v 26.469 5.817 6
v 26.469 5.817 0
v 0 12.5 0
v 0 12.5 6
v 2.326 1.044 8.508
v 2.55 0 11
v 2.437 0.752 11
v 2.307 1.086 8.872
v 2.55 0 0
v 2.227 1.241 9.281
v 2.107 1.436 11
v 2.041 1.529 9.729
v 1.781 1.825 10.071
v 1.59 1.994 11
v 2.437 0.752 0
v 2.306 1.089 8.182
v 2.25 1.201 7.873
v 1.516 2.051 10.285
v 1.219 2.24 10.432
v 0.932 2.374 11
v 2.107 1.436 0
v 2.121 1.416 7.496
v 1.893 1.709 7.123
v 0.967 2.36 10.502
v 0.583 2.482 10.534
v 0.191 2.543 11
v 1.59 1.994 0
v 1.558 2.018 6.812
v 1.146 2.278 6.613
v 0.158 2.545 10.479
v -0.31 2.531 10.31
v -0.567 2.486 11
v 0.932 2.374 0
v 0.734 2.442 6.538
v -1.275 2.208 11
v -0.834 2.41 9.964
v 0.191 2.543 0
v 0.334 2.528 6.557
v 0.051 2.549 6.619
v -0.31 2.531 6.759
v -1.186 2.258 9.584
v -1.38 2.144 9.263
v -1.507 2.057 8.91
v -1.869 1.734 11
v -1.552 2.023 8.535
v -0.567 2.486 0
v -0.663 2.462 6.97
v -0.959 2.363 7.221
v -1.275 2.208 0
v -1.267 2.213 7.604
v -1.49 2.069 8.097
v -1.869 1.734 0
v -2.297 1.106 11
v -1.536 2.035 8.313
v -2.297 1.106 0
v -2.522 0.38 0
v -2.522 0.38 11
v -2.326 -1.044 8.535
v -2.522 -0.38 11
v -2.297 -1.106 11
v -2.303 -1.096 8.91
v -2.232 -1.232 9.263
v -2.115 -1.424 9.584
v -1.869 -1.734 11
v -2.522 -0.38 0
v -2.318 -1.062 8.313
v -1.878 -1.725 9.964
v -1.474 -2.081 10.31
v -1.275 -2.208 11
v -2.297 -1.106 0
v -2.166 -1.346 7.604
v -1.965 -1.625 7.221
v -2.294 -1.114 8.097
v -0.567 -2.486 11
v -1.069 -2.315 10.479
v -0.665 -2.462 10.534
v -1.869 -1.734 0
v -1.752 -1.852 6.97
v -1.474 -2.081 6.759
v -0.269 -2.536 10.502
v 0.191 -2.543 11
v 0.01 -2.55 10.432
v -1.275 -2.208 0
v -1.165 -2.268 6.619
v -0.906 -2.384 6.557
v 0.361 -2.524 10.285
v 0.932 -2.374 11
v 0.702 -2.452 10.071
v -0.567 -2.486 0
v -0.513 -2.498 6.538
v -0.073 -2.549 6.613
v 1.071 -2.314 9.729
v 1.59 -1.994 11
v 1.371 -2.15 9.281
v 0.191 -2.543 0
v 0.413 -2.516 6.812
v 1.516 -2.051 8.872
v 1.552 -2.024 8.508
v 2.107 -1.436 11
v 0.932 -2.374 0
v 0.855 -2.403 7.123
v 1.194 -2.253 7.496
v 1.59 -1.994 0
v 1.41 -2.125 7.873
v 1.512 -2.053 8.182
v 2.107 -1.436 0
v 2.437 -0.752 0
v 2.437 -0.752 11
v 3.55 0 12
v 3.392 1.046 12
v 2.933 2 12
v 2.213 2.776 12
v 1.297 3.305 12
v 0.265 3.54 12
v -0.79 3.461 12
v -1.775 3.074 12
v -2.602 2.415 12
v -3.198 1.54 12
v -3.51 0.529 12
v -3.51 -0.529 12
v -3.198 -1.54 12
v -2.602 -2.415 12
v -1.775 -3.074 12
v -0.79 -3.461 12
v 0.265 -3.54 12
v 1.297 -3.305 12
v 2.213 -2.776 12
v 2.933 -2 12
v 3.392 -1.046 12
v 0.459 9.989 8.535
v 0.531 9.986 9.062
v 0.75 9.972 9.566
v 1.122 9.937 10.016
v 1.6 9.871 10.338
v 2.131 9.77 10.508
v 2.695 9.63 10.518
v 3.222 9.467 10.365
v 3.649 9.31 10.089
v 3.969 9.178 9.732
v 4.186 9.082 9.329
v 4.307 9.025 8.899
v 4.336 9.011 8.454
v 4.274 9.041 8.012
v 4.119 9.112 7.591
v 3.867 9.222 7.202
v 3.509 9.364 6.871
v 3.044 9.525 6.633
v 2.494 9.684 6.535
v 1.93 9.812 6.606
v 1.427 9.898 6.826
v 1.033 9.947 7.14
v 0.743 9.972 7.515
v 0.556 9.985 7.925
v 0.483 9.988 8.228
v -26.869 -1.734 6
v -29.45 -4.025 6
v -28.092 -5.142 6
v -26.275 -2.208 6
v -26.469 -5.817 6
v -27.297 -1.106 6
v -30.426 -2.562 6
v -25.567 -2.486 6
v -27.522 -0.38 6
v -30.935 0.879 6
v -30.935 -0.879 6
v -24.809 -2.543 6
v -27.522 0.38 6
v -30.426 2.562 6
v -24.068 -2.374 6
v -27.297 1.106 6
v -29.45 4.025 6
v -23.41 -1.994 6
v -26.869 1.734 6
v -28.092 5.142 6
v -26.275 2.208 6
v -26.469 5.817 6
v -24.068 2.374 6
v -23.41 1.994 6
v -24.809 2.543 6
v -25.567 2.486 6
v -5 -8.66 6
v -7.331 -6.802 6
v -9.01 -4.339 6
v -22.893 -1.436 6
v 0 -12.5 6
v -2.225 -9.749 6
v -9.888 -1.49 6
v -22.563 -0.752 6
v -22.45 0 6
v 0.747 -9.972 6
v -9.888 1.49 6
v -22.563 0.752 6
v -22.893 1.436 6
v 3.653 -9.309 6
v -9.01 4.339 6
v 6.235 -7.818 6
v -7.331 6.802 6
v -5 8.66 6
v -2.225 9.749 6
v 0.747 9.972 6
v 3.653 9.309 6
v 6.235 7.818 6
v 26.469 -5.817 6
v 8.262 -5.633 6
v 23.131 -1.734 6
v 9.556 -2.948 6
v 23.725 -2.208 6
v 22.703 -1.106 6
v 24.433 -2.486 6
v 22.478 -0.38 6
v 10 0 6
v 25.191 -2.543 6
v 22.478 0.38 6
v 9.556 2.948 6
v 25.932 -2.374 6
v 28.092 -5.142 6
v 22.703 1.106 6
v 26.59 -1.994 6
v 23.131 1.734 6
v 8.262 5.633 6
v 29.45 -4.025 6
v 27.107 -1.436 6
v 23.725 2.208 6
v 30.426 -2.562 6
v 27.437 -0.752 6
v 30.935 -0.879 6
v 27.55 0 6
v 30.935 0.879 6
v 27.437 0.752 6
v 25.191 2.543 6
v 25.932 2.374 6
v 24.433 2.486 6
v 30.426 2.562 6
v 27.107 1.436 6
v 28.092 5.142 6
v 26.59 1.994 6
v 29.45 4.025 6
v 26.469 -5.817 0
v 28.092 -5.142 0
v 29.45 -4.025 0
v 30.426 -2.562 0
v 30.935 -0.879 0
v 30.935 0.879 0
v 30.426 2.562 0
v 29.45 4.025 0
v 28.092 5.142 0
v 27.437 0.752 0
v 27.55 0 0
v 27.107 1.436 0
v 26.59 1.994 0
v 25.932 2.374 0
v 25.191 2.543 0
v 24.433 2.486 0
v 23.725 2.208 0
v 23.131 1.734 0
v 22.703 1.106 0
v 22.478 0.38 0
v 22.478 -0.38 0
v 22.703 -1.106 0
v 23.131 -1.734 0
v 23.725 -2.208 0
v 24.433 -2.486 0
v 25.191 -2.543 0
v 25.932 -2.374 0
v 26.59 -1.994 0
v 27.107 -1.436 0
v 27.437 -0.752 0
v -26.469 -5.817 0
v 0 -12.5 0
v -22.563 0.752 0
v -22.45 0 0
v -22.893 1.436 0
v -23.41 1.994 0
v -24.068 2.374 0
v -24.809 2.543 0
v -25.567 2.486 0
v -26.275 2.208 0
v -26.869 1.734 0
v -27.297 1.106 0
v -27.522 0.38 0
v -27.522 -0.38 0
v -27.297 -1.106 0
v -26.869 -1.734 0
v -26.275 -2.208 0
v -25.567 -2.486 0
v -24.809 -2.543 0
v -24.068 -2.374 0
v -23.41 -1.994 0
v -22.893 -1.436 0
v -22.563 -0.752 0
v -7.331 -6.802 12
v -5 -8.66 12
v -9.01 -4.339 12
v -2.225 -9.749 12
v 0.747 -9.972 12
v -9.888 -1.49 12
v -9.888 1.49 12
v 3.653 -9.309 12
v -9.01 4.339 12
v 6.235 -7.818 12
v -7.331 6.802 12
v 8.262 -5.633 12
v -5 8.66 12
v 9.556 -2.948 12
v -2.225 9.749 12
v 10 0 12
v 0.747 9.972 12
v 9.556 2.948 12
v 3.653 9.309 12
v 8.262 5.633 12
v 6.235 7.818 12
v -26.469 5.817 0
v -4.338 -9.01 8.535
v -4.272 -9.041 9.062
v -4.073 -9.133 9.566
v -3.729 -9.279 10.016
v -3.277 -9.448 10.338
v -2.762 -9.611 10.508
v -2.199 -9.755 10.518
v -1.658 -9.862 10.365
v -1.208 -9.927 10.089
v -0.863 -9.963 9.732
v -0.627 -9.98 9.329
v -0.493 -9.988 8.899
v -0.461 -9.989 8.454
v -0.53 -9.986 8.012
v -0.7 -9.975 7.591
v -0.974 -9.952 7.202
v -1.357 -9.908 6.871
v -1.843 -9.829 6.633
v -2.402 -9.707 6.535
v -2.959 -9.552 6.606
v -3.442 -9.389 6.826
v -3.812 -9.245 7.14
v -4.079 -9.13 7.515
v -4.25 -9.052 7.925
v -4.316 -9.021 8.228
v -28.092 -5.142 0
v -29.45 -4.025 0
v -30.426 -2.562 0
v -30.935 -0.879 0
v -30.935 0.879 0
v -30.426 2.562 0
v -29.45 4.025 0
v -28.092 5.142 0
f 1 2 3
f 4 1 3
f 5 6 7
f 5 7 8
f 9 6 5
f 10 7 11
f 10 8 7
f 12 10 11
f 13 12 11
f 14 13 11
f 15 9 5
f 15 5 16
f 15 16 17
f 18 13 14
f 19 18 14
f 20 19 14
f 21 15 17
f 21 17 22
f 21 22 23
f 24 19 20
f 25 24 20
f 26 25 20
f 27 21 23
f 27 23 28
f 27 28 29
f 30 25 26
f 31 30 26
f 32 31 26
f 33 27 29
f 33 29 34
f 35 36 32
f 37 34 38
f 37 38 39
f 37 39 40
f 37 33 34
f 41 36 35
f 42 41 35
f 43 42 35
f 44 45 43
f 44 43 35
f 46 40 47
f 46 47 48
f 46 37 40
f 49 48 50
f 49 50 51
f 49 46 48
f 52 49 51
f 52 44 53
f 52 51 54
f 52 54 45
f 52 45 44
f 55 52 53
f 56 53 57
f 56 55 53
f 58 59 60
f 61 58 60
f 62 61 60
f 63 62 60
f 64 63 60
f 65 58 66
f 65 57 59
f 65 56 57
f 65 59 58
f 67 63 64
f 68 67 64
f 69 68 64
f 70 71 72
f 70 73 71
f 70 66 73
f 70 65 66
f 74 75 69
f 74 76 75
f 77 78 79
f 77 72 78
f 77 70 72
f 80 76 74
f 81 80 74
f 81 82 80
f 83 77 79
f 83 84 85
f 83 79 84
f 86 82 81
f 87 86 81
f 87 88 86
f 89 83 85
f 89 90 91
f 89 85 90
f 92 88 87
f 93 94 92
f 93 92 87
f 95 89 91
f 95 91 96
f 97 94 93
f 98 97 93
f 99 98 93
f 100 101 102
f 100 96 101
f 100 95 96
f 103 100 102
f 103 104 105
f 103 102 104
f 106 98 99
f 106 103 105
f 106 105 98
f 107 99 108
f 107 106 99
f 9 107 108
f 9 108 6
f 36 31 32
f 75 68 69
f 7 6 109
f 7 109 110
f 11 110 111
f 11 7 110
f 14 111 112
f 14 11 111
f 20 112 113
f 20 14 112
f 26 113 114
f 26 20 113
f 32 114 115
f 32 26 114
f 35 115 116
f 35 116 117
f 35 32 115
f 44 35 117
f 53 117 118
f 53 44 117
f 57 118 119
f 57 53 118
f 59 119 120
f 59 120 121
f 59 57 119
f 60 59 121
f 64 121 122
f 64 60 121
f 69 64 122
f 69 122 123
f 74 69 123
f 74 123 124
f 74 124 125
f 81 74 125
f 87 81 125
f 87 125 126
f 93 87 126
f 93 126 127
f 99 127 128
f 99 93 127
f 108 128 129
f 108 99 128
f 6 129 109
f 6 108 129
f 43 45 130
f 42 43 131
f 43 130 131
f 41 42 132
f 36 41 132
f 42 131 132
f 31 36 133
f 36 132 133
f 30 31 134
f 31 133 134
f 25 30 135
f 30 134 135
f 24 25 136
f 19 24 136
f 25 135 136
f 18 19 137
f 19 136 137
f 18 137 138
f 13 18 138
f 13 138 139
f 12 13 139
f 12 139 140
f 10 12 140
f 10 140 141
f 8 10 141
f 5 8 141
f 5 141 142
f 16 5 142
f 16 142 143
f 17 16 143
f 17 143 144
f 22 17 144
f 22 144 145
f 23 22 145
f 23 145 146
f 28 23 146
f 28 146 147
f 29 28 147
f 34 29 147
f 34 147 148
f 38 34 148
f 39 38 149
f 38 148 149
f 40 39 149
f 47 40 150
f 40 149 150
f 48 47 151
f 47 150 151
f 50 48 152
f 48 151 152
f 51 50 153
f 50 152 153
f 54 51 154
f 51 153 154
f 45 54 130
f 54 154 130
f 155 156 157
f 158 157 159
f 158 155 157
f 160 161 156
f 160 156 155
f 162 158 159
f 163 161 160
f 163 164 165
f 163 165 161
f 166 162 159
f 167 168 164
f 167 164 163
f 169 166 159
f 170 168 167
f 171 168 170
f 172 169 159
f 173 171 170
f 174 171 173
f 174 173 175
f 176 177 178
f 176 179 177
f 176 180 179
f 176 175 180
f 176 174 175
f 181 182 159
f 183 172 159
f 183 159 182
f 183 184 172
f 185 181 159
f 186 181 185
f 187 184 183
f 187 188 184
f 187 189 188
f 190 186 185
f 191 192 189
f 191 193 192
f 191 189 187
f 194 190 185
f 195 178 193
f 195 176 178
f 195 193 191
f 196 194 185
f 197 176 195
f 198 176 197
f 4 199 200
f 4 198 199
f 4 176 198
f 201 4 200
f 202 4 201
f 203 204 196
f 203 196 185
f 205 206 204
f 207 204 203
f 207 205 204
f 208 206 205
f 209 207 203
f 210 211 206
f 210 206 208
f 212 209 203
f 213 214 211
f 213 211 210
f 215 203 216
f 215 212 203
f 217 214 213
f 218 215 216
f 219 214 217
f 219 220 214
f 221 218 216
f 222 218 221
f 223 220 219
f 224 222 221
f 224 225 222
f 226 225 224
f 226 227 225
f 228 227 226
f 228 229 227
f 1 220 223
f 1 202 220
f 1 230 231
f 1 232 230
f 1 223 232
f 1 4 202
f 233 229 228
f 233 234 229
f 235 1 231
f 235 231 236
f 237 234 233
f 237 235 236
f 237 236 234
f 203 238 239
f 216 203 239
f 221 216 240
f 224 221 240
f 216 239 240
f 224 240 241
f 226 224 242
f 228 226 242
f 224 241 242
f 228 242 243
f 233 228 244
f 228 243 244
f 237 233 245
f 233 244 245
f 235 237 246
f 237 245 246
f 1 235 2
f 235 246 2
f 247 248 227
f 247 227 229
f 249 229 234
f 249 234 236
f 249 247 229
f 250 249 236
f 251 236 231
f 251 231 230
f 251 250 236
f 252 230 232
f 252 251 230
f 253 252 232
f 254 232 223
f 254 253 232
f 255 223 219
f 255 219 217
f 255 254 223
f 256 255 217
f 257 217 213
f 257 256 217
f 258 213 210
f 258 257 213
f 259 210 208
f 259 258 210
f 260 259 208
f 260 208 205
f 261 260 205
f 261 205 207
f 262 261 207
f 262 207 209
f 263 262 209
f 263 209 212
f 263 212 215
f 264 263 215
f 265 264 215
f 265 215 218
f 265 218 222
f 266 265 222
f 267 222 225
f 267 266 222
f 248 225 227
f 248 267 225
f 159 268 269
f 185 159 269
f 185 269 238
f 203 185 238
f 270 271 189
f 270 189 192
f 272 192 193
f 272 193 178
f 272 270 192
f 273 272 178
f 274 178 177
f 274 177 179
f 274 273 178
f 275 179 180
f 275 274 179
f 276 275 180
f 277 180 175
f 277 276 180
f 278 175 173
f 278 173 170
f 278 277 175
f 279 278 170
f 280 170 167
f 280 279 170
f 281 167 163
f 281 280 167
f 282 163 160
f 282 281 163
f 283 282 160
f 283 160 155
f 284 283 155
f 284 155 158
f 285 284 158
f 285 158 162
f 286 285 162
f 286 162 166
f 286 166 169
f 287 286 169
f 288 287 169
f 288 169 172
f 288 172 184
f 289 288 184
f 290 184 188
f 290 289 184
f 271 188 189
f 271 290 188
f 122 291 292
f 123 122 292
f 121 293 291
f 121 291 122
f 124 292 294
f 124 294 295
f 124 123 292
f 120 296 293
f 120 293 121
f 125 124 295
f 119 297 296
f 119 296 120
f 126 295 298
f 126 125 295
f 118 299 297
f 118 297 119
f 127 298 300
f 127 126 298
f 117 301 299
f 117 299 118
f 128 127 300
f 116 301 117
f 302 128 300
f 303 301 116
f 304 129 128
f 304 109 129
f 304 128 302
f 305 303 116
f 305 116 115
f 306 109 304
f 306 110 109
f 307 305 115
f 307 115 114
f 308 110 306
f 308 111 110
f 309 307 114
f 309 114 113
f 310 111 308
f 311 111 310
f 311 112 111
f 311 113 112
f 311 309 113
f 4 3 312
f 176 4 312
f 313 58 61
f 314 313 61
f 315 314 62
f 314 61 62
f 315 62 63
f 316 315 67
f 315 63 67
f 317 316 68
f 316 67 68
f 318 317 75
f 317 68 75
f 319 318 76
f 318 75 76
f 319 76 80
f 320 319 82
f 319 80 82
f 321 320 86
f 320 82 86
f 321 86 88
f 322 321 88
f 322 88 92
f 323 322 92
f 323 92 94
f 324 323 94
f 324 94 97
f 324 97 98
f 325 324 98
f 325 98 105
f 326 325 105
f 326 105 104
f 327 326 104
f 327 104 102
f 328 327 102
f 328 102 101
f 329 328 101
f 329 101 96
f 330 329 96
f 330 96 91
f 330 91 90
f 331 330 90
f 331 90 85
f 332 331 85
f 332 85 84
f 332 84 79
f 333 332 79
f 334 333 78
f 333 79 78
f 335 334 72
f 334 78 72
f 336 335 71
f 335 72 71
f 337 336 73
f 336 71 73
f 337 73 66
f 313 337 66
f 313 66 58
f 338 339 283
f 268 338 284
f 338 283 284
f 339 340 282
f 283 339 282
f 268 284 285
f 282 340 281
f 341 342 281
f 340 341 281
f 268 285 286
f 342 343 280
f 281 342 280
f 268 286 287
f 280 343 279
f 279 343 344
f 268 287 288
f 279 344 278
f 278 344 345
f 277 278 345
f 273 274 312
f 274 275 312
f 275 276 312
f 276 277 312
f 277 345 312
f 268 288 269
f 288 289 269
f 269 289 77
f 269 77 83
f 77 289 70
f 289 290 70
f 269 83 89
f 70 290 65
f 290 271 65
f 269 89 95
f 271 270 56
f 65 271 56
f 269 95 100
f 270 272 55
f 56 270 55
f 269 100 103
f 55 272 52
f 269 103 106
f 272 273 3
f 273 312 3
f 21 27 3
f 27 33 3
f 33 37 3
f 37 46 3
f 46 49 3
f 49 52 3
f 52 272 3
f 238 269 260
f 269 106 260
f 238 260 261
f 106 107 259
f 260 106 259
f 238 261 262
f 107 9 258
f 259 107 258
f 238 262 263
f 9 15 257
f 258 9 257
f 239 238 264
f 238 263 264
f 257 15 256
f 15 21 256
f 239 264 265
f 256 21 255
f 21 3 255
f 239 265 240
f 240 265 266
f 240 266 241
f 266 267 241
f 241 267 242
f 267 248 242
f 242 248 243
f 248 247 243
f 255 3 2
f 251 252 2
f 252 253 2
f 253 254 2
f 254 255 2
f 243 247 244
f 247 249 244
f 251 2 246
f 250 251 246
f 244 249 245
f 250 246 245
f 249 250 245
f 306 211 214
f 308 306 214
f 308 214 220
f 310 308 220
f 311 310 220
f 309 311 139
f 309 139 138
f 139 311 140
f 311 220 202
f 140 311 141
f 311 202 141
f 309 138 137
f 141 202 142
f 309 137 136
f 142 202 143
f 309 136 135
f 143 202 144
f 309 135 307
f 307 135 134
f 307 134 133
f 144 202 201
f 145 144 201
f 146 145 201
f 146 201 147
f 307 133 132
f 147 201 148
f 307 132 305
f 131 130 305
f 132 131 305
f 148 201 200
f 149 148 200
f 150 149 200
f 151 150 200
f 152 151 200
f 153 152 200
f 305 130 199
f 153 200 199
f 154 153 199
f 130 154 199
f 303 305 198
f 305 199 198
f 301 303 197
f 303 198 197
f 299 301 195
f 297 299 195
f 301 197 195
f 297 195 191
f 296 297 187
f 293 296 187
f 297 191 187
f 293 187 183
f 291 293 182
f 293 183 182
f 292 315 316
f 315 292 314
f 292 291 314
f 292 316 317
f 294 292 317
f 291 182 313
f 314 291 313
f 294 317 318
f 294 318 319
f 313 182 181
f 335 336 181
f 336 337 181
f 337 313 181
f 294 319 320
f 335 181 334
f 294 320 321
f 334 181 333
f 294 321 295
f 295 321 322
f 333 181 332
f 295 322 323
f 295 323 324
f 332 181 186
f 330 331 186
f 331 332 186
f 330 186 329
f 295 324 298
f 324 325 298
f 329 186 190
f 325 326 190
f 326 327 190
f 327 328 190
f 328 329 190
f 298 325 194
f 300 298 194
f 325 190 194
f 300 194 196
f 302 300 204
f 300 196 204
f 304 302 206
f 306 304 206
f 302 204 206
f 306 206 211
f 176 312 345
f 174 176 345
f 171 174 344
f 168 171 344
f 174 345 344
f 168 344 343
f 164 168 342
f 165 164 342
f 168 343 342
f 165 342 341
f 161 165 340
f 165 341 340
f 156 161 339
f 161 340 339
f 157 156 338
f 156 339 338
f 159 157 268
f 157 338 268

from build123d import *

# Parameters (mm, degrees)
SKETCH_R      = 2.55
PAD_DEPTH     = 6
SKETCH001_R   = 10
SKETCH001_R_2 = 2.55
PAD001_DEPTH  = 6
CHAMFER_SIZE  = 1
SKETCH002_R   = 2
POCKET_DEPTH  = 31.828851


with BuildPart() as part:
    # Sketch → Pad (new body)
    with BuildSketch(Plane.XY):
        with BuildLine():
            ThreePointArc((26.46873, -5.817459), (31, 0), (26.46873, 5.817459))
            Line((26.46873, 5.817459), (0, 12.5))
            Line((0, 12.5), (-26.46873, 5.817459))
            ThreePointArc((-26.46873, 5.817459), (-31, 0), (-26.46873, -5.817459))
            Line((-26.46873, -5.817459), (0, -12.5))
            Line((0, -12.5), (26.46873, -5.817459))
        make_face()
        Circle(SKETCH_R, mode=Mode.SUBTRACT)
        with Locations((-25, 0)):
            Circle(SKETCH_R, mode=Mode.SUBTRACT)
        with Locations((25, 0)):
            Circle(SKETCH_R, mode=Mode.SUBTRACT)
    extrude(amount=PAD_DEPTH)

    # Sketch001 (on Face11 of Pad) → Pad001 (join)
    with BuildSketch(Plane.XY.offset(6)):
        Circle(SKETCH001_R)
        Circle(SKETCH001_R_2, mode=Mode.SUBTRACT)
    extrude(amount=PAD001_DEPTH)

    # Chamfer
    chamfer_edges = [part.edges().sort_by_distance(p)[0] for p in [
        (-2.55, 0, 12),
    ]]
    chamfer(chamfer_edges, length=CHAMFER_SIZE)

    # Sketch002 (on Face8 of Chamfer) → Pocket (cut, through all)
    with BuildSketch(Plane(origin=(2.966762, 11.750984, 0), x_dir=(-0.969577, 0.244788, 0), z_dir=(0.244788, 0.969577, 0))):
        with Locations((0, 8.534735)):
            Circle(SKETCH002_R)
    extrude(amount=-POCKET_DEPTH, mode=Mode.SUBTRACT)


solid = part.part
